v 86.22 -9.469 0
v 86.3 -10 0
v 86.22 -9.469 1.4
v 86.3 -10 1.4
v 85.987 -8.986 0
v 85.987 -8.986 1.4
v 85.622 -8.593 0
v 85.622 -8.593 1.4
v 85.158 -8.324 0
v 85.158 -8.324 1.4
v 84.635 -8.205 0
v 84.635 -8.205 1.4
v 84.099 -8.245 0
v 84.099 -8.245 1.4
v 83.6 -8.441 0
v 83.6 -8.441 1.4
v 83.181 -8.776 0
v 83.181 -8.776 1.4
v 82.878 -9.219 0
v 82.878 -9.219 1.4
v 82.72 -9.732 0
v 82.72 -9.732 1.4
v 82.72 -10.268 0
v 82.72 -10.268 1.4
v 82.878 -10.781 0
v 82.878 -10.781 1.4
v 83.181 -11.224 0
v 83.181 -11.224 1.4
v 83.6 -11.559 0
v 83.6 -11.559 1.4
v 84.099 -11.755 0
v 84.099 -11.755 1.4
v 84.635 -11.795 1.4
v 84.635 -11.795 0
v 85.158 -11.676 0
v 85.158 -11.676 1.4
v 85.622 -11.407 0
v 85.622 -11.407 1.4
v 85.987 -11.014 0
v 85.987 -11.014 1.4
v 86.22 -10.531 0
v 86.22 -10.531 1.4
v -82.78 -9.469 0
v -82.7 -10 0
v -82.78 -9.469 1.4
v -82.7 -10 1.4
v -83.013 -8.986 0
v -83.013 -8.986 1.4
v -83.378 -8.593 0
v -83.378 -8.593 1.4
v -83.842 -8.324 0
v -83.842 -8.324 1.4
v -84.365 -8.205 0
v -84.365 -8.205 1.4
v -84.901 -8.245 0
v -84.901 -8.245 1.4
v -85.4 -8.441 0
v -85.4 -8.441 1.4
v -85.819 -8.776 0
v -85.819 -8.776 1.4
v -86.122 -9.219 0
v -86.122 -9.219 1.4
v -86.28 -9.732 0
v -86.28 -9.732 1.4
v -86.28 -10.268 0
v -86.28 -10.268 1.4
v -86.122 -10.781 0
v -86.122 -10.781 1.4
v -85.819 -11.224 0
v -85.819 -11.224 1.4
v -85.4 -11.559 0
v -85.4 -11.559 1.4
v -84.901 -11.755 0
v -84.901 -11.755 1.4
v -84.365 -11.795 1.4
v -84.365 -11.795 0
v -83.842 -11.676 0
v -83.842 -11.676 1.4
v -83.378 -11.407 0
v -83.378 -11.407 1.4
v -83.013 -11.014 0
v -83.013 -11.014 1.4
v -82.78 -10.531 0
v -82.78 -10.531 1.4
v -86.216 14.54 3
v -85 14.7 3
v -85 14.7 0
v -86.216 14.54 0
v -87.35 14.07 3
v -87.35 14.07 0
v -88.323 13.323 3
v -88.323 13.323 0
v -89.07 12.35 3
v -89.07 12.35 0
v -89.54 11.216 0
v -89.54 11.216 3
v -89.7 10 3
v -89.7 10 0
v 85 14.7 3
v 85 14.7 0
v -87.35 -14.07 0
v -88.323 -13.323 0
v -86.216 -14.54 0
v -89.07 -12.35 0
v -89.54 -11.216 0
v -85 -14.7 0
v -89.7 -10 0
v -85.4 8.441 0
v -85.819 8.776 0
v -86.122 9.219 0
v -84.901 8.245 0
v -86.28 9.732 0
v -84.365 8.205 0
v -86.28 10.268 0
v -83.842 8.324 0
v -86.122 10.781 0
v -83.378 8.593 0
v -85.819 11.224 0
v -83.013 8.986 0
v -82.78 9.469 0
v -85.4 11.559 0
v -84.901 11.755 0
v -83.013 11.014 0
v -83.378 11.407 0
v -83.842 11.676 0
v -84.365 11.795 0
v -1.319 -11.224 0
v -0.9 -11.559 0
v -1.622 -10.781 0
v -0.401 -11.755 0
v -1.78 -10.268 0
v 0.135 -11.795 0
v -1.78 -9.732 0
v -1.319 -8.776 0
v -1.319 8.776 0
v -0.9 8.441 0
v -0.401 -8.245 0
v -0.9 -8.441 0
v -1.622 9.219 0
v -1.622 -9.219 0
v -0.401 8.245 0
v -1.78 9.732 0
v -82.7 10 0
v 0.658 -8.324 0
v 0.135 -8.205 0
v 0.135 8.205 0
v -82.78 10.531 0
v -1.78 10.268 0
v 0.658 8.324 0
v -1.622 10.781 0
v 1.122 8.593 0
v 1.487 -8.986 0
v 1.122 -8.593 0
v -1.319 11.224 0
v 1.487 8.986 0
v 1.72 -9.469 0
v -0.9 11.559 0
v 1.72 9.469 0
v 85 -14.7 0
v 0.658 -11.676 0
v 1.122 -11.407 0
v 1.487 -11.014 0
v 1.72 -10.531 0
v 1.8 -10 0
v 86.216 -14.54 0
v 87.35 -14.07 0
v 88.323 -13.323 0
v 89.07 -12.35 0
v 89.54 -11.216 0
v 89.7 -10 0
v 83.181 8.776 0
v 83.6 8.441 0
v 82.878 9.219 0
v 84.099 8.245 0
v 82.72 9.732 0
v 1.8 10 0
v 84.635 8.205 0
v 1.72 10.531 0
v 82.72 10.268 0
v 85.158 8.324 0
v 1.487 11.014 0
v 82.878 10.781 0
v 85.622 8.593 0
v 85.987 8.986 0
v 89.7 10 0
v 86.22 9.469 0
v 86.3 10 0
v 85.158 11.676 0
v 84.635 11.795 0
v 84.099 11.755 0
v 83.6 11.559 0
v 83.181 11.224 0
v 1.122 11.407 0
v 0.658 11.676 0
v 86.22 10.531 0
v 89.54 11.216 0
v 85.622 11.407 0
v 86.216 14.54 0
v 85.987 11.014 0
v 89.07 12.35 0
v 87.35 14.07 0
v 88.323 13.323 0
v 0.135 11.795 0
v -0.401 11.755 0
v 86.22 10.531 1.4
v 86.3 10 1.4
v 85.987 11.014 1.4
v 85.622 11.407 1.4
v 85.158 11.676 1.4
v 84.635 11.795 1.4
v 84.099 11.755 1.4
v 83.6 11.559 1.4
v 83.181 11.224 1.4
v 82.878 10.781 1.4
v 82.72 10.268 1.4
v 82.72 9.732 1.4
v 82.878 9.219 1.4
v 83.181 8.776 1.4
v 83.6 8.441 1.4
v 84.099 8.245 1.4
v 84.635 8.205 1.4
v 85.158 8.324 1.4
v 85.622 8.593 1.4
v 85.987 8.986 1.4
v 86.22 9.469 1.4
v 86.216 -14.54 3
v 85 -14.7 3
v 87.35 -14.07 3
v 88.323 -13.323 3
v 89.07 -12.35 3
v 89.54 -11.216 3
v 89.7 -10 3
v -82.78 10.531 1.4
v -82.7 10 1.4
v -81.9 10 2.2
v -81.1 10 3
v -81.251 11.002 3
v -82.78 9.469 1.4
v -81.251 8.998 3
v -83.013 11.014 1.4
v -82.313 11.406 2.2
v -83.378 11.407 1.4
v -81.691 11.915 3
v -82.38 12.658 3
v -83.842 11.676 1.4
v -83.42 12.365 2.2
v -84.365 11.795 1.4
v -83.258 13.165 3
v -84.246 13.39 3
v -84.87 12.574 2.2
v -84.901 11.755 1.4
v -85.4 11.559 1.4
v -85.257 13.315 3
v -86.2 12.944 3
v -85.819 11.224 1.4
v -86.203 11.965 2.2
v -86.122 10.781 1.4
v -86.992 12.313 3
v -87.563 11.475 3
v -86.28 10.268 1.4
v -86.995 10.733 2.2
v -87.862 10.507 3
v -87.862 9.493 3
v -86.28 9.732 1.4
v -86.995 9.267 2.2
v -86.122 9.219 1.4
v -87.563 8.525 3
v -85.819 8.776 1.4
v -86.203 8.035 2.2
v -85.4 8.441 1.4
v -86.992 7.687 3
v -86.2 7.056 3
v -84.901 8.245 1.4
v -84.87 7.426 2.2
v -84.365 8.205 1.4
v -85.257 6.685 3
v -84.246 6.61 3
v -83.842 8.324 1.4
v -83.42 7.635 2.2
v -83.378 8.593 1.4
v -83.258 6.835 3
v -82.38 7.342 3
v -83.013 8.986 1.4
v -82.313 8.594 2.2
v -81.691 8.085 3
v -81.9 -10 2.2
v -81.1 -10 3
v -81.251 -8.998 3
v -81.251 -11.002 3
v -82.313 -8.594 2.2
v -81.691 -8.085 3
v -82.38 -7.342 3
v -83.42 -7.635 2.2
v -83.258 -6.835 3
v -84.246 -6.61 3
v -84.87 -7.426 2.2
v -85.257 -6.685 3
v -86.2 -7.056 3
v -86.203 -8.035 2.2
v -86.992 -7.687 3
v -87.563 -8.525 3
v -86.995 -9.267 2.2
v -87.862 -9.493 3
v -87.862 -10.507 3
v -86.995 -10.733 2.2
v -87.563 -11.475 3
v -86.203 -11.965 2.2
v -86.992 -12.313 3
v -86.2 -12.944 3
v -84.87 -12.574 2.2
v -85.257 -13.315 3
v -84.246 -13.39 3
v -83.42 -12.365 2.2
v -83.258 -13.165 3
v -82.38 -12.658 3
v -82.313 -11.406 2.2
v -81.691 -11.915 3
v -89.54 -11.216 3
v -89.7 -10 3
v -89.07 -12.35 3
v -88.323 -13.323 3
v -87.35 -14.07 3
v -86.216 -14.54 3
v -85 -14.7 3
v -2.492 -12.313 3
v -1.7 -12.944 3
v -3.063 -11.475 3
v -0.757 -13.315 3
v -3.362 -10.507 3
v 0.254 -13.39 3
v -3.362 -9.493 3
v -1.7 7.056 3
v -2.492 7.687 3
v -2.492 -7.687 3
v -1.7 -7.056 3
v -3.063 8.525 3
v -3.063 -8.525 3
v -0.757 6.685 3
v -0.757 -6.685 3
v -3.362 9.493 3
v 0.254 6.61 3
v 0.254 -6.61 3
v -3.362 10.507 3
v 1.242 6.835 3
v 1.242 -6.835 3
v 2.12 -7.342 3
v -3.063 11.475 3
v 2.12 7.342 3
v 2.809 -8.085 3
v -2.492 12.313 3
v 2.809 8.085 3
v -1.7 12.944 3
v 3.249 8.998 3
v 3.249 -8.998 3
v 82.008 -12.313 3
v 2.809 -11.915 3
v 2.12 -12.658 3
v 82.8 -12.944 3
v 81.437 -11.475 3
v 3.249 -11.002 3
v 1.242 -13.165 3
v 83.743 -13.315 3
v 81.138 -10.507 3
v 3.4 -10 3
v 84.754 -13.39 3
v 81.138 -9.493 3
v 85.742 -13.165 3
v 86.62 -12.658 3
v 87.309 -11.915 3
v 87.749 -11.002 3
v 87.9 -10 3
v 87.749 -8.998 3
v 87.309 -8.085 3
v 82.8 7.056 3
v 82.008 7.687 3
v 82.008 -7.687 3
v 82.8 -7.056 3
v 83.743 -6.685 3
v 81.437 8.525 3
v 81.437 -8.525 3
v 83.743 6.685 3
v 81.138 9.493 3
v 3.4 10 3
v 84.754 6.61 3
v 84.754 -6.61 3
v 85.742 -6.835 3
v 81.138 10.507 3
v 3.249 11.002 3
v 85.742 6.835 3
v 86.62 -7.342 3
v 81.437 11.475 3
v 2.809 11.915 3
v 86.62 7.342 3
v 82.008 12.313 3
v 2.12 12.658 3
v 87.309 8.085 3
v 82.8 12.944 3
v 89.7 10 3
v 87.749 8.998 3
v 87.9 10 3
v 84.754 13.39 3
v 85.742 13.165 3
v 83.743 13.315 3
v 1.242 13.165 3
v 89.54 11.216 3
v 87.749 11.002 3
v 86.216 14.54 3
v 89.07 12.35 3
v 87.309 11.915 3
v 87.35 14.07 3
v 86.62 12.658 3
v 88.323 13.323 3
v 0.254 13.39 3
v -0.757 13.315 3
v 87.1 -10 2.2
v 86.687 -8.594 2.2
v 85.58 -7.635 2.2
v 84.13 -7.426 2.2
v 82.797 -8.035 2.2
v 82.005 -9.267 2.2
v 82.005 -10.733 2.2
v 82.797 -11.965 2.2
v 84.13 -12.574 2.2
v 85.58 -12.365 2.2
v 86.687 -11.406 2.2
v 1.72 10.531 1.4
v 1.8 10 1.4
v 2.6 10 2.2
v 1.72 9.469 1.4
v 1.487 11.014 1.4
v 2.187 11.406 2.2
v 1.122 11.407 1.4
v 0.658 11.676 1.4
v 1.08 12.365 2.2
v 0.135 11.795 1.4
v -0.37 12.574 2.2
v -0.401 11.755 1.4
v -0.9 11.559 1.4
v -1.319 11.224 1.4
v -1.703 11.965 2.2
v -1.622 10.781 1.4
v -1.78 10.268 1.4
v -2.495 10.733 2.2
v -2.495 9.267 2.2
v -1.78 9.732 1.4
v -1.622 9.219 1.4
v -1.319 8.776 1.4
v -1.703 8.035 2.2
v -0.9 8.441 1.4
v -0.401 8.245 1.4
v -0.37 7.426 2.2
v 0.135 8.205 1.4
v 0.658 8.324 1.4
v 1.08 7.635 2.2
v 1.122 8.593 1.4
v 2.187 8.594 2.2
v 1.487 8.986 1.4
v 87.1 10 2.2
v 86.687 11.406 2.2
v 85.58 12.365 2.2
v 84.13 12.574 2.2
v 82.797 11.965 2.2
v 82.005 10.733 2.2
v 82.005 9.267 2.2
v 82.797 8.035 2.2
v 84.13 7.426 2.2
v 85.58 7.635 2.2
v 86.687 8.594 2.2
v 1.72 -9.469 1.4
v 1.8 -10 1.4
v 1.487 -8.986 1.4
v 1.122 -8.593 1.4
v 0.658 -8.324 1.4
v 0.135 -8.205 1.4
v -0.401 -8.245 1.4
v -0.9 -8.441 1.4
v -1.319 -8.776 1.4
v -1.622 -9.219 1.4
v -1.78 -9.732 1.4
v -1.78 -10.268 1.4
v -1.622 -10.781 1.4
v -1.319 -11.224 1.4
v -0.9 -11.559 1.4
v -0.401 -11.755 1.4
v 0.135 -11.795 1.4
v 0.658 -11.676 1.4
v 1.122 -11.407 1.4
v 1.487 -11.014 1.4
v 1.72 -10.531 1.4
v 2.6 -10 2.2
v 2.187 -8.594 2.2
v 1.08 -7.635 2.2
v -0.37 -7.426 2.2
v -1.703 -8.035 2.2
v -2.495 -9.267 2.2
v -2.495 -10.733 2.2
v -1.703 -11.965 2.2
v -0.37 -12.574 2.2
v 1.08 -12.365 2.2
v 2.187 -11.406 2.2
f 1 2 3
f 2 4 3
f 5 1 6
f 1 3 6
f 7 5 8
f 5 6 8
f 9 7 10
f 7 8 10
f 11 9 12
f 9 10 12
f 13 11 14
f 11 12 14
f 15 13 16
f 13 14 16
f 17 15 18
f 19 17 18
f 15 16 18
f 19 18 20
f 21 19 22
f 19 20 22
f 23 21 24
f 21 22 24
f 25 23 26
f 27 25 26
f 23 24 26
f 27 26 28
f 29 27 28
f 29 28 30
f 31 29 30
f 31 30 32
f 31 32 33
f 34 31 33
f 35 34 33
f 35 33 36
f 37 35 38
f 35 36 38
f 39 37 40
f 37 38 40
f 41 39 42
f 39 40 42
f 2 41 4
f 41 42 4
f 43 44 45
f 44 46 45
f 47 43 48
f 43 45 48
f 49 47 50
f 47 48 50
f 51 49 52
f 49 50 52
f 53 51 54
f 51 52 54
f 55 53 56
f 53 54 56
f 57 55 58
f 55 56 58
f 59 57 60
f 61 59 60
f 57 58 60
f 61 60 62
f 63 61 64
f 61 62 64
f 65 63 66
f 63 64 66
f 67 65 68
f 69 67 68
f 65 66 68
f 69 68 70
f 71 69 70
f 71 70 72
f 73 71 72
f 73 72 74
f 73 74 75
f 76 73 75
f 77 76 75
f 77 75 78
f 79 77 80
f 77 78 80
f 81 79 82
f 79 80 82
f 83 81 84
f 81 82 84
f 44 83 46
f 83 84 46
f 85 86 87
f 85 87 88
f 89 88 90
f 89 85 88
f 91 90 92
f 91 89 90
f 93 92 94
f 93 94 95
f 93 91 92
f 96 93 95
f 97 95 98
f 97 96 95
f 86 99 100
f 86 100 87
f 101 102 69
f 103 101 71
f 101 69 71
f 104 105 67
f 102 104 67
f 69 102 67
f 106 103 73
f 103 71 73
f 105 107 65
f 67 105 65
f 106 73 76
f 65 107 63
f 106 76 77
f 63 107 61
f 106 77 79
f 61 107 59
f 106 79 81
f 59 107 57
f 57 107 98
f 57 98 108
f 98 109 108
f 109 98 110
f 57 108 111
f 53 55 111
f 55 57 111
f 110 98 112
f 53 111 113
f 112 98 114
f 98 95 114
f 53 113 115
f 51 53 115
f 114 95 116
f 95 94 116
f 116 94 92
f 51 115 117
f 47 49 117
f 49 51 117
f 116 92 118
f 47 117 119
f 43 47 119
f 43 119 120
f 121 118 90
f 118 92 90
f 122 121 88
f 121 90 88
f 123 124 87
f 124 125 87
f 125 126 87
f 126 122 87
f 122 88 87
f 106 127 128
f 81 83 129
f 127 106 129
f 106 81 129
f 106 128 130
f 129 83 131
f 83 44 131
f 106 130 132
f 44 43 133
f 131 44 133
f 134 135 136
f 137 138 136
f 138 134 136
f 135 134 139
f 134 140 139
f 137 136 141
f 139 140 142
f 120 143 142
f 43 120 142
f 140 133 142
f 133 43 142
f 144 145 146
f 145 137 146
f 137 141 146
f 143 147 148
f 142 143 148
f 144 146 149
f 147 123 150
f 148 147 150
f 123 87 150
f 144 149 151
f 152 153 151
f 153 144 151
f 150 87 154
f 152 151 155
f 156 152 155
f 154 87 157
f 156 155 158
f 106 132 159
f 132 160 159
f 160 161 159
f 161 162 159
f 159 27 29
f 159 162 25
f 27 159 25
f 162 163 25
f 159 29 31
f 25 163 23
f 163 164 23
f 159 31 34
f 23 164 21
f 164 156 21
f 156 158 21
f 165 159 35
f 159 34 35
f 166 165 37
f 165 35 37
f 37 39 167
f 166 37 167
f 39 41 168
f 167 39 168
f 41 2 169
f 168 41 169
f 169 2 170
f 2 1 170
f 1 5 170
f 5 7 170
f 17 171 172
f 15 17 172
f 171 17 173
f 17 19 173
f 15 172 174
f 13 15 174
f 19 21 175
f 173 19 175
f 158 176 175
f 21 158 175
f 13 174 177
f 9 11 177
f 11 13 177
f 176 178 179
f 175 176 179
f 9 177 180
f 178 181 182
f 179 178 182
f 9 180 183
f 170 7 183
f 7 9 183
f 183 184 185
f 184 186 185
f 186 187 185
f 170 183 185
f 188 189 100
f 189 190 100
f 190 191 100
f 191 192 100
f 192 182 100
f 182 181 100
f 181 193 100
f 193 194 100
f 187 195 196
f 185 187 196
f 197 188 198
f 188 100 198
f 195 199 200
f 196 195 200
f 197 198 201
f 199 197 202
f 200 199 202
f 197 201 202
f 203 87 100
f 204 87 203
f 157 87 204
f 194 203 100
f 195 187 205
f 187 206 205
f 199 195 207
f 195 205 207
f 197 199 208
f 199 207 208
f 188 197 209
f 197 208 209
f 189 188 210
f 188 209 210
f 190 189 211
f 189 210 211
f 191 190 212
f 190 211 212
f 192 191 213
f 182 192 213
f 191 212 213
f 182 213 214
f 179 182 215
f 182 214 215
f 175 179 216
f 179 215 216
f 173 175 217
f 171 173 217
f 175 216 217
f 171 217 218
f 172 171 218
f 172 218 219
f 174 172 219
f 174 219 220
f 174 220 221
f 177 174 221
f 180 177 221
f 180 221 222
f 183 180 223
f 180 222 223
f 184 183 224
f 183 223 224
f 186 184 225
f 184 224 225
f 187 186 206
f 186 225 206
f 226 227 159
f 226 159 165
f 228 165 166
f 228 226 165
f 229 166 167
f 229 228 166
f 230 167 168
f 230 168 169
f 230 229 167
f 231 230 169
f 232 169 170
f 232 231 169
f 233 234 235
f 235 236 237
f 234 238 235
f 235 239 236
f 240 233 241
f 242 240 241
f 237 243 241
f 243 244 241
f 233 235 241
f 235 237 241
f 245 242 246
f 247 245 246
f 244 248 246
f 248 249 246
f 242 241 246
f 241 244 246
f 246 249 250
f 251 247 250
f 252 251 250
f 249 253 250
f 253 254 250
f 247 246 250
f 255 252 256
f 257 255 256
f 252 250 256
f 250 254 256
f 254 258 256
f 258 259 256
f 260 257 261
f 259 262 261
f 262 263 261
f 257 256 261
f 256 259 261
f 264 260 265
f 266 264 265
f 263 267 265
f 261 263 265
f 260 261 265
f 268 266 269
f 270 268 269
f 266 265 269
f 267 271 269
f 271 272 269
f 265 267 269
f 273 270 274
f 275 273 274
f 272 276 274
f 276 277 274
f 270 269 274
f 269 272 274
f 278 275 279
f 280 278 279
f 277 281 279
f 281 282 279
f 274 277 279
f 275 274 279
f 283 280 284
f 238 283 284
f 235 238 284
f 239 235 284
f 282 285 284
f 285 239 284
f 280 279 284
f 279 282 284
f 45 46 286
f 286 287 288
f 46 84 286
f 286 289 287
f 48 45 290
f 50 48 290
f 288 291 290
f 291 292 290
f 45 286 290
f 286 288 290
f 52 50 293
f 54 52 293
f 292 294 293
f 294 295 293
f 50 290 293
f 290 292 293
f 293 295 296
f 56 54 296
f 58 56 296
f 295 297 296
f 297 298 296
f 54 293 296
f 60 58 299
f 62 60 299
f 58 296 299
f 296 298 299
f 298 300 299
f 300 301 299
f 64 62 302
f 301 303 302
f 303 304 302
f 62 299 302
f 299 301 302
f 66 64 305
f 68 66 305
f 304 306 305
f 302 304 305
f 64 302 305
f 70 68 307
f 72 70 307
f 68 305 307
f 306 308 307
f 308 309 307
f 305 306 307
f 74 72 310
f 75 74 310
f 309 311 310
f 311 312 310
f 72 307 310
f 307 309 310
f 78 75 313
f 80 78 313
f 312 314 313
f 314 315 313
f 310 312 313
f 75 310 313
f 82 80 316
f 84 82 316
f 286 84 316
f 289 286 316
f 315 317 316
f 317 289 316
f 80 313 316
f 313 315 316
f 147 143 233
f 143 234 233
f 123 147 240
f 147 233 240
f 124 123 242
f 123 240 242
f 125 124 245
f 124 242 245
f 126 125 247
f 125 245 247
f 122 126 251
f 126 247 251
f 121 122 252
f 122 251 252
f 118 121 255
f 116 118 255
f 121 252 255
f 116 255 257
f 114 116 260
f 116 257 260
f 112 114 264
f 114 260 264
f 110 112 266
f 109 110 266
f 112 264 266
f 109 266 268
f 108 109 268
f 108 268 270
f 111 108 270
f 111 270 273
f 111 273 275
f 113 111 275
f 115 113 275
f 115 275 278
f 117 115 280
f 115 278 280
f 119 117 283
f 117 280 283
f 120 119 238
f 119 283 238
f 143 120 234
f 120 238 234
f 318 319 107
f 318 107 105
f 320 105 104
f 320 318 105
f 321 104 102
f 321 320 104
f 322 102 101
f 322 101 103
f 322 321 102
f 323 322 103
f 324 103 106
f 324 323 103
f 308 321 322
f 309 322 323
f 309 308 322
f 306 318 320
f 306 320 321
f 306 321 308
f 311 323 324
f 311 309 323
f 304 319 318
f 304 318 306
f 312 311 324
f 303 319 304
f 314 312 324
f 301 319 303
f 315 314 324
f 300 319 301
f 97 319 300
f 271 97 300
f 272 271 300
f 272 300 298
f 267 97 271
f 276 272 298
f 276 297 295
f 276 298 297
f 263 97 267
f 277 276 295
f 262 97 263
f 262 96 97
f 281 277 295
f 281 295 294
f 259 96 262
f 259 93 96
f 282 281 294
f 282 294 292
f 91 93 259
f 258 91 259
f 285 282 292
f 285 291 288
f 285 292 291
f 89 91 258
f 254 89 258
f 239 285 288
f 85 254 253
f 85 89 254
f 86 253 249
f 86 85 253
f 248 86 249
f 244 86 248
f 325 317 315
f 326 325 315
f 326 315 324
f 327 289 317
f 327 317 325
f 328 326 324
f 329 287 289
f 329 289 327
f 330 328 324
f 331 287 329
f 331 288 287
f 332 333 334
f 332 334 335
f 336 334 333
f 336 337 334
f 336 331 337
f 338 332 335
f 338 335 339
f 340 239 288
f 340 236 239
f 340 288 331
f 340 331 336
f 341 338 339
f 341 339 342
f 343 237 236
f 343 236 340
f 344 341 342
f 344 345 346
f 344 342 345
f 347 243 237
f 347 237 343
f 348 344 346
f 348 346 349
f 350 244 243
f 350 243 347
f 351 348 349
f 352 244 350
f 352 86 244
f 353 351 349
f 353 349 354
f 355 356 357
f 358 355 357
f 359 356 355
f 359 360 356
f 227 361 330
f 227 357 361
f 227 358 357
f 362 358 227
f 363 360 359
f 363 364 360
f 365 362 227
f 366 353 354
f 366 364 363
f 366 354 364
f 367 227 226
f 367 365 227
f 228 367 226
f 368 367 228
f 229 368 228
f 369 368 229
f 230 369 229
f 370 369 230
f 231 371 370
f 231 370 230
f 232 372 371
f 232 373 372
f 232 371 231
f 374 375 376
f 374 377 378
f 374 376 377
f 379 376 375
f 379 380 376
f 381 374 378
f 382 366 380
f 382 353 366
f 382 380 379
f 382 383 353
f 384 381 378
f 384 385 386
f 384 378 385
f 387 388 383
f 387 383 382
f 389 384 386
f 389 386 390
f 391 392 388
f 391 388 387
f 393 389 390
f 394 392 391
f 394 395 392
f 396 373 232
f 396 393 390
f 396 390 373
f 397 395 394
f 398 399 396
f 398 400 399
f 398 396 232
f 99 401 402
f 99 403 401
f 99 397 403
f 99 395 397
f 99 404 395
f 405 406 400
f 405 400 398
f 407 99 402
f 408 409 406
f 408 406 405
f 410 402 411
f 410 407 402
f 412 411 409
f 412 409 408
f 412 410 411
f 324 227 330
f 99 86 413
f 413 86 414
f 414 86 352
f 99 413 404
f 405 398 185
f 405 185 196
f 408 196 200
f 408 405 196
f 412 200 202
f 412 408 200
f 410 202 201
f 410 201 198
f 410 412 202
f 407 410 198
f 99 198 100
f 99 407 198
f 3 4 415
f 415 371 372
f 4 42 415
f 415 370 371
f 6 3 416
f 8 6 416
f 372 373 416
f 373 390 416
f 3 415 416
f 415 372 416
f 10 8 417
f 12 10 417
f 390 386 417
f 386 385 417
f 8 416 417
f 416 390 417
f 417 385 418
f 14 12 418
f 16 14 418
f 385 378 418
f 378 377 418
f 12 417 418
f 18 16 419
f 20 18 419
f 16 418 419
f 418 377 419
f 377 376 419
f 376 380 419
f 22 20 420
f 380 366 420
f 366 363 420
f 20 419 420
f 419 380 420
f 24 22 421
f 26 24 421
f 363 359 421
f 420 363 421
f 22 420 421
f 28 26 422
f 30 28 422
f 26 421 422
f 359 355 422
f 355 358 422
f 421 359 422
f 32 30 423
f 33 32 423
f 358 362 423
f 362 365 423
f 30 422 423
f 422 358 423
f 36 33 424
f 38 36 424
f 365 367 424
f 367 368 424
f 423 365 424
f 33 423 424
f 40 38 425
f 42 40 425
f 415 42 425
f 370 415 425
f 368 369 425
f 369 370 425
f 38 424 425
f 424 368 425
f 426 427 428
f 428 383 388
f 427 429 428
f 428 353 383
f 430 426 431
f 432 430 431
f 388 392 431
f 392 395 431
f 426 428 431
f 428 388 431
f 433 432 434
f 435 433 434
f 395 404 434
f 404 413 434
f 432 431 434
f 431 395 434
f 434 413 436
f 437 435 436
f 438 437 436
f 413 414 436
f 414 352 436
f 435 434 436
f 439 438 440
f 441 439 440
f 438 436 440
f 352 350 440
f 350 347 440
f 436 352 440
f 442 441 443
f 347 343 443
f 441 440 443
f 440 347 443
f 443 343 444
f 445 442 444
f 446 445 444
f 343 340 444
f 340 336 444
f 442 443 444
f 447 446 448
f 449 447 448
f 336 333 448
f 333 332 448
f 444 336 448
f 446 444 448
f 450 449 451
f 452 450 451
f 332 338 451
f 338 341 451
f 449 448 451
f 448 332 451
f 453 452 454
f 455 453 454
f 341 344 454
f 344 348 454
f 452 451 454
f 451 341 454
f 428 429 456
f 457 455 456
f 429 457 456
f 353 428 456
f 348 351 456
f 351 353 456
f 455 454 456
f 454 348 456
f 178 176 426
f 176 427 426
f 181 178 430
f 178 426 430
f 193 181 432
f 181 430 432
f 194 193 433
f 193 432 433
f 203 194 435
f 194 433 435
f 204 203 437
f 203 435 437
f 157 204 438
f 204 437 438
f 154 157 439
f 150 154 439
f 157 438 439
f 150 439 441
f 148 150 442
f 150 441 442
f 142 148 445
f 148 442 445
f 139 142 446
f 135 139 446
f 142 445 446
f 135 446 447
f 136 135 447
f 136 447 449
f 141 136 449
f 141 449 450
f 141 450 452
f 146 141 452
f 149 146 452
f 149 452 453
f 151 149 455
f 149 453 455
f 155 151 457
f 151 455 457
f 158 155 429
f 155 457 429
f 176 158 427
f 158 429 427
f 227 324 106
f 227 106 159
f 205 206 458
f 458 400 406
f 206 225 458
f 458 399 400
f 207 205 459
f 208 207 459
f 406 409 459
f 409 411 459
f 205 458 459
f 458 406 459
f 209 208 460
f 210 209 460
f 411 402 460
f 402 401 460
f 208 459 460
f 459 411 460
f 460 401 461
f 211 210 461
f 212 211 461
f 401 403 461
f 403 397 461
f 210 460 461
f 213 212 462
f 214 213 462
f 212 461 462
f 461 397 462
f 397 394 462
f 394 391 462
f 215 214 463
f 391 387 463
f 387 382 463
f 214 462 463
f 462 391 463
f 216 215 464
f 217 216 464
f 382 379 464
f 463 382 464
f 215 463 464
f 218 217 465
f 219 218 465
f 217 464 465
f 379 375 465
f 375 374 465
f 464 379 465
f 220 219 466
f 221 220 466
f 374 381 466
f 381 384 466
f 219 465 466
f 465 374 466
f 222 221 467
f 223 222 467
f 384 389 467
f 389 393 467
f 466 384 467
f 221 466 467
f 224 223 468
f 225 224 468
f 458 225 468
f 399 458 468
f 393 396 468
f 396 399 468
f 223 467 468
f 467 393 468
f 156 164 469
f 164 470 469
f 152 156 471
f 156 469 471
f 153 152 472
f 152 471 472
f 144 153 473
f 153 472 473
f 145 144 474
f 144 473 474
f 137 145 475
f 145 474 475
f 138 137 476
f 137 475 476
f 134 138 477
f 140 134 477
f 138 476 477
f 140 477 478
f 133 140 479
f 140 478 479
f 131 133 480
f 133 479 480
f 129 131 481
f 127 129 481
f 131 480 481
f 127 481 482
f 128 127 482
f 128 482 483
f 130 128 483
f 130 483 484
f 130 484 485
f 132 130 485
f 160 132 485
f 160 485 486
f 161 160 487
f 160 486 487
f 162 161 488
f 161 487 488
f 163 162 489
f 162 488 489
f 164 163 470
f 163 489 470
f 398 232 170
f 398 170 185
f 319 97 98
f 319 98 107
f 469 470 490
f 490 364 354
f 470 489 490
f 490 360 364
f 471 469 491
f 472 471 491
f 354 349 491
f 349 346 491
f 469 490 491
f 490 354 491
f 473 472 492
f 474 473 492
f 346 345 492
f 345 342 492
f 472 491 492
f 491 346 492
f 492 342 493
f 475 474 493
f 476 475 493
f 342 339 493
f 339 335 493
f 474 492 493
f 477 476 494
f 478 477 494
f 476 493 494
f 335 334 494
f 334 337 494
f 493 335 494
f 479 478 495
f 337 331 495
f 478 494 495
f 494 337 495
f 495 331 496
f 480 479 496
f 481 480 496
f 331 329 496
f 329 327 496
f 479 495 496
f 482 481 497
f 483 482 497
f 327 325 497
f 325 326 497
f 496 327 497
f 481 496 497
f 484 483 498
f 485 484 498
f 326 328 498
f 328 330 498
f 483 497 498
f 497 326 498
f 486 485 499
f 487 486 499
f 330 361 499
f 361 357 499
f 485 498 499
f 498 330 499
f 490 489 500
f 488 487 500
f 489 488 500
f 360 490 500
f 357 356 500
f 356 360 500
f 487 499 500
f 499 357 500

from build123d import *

# Parameters (mm, degrees)
SKETCH1_W           = 180
SKETCH1_H           = 30
BOSS_EXTRUDE1_DEPTH = 3
FILLET1_R           = 5
CUT_EXTRUDE1_DEPTH  = 92.290744328


# Read off the part's stored shape, not the designer's step: CSK for M3 Flat Head Machine Screw1
with BuildPart() as part:
    # Sketch1 → Boss-Extrude1 (new body)
    with BuildSketch(Plane.XY):
        Rectangle(SKETCH1_W, SKETCH1_H)
    extrude(amount=BOSS_EXTRUDE1_DEPTH)

    # Fillet1
    fillet1_edges = [part.edges().sort_by_distance(p)[0] for p in [
        (90, -15, 1.5),
        (-90, -15, 1.5),
        (-90, 15, 1.5),
        (90, 15, 1.5),
    ]]
    fillet(fillet1_edges, radius=FILLET1_R)

    # CSK for M3 Flat Head Machine Screw1 outl → CSK for M3 Flat Head Machine Screw1 (revolve, cut)
    with BuildSketch(Plane.XZ.offset(10)):
        Polygon((0, 0), (1.8, 0), (1.8, 1.4), (3.4, 3), (0, 3), align=None)
    revolve(axis=Axis((0, -10, 0), (0, 0, 1)), mode=Mode.SUBTRACT)

    # CSK for M3 Flat Head Machine Screw1 2 ou → CSK for M3 Flat Head Machine Screw1 2 (revolve, cut)
    with BuildSketch(Plane.XZ.offset(-10)):
        Polygon((0, 0), (1.8, 0), (1.8, 1.4), (3.4, 3), (0, 3), align=None)
    revolve(axis=Axis((0, 10, 0), (0, 0, 1)), mode=Mode.SUBTRACT)

    # CSK for M3 Flat Head Machine Screw1 3 ou → CSK for M3 Flat Head Machine Screw1 3 (revolve, cut)
    with BuildSketch(Plane(origin=(-84.5, -10, 0), x_dir=(1, 0, 0), z_dir=(0, -1, 0))):
        Polygon((0, 0), (1.8, 0), (1.8, 1.4), (3.4, 3), (0, 3), align=None)
    revolve(axis=Axis((-84.5, -10, 0), (0, 0, 1)), mode=Mode.SUBTRACT)

    # CSK for M3 Flat Head Machine Screw1 4 ou → CSK for M3 Flat Head Machine Screw1 4 (revolve, cut)
    with BuildSketch(Plane(origin=(84.5, 10, 0), x_dir=(1, 0, 0), z_dir=(0, -1, 0))):
        Polygon((0, 0), (1.8, 0), (1.8, 1.4), (3.4, 3), (0, 3), align=None)
    revolve(axis=Axis((84.5, 10, 0), (0, 0, 1)), mode=Mode.SUBTRACT)

    # CSK for M3 Flat Head Machine Screw1 5 ou → CSK for M3 Flat Head Machine Screw1 5 (revolve, cut)
    with BuildSketch(Plane(origin=(84.5, -10, 0), x_dir=(1, 0, 0), z_dir=(0, -1, 0))):
        Polygon((0, 0), (1.8, 0), (1.8, 1.4), (3.4, 3), (0, 3), align=None)
    revolve(axis=Axis((84.5, -10, 0), (0, 0, 1)), mode=Mode.SUBTRACT)

    # CSK for M3 Flat Head Machine Screw1 6 ou → CSK for M3 Flat Head Machine Screw1 6 (revolve, cut)
    with BuildSketch(Plane(origin=(-84.5, 10, 0), x_dir=(1, 0, 0), z_dir=(0, -1, 0))):
        Polygon((0, 0), (1.8, 0), (1.8, 1.4), (3.4, 3), (0, 3), align=None)
    revolve(axis=Axis((-84.5, 10, 0), (0, 0, 1)), mode=Mode.SUBTRACT)

    # Sketch5 → Cut-Extrude1 (cut, through all)
    with BuildSketch(Plane.XY.offset(3)):
        with BuildLine():
            Line((-85, -15), (85, -15))
            ThreePointArc((85, -15), (88.535533906, -13.535533906), (90, -10))
            Line((90, -10), (90, 10))
            ThreePointArc((90, 10), (88.535533906, 13.535533906), (85, 15))
            Line((85, 15), (-85, 15))
            ThreePointArc((-85, 15), (-88.535533906, 13.535533906), (-90, 10))
            Line((-90, 10), (-90, -10))
            ThreePointArc((-90, -10), (-88.535533906, -13.535533906), (-85, -15))
        make_face()
        with BuildLine():
            Line((-85, -14.7), (85, -14.7))
            ThreePointArc((85, -14.7), (88.323401872, -13.323401872), (89.7, -10))
            Line((89.7, -10), (89.7, 10))
            ThreePointArc((89.7, 10), (88.323401872, 13.323401872), (85, 14.7))
            Line((85, 14.7), (-85, 14.7))
            ThreePointArc((-85, 14.7), (-88.323401872, 13.323401872), (-89.7, 10))
            Line((-89.7, 10), (-89.7, -10))
            ThreePointArc((-89.7, -10), (-88.323401872, -13.323401872), (-85, -14.7))
        make_face(mode=Mode.SUBTRACT)
    extrude(amount=-CUT_EXTRUDE1_DEPTH, mode=Mode.SUBTRACT)


solid = part.part
